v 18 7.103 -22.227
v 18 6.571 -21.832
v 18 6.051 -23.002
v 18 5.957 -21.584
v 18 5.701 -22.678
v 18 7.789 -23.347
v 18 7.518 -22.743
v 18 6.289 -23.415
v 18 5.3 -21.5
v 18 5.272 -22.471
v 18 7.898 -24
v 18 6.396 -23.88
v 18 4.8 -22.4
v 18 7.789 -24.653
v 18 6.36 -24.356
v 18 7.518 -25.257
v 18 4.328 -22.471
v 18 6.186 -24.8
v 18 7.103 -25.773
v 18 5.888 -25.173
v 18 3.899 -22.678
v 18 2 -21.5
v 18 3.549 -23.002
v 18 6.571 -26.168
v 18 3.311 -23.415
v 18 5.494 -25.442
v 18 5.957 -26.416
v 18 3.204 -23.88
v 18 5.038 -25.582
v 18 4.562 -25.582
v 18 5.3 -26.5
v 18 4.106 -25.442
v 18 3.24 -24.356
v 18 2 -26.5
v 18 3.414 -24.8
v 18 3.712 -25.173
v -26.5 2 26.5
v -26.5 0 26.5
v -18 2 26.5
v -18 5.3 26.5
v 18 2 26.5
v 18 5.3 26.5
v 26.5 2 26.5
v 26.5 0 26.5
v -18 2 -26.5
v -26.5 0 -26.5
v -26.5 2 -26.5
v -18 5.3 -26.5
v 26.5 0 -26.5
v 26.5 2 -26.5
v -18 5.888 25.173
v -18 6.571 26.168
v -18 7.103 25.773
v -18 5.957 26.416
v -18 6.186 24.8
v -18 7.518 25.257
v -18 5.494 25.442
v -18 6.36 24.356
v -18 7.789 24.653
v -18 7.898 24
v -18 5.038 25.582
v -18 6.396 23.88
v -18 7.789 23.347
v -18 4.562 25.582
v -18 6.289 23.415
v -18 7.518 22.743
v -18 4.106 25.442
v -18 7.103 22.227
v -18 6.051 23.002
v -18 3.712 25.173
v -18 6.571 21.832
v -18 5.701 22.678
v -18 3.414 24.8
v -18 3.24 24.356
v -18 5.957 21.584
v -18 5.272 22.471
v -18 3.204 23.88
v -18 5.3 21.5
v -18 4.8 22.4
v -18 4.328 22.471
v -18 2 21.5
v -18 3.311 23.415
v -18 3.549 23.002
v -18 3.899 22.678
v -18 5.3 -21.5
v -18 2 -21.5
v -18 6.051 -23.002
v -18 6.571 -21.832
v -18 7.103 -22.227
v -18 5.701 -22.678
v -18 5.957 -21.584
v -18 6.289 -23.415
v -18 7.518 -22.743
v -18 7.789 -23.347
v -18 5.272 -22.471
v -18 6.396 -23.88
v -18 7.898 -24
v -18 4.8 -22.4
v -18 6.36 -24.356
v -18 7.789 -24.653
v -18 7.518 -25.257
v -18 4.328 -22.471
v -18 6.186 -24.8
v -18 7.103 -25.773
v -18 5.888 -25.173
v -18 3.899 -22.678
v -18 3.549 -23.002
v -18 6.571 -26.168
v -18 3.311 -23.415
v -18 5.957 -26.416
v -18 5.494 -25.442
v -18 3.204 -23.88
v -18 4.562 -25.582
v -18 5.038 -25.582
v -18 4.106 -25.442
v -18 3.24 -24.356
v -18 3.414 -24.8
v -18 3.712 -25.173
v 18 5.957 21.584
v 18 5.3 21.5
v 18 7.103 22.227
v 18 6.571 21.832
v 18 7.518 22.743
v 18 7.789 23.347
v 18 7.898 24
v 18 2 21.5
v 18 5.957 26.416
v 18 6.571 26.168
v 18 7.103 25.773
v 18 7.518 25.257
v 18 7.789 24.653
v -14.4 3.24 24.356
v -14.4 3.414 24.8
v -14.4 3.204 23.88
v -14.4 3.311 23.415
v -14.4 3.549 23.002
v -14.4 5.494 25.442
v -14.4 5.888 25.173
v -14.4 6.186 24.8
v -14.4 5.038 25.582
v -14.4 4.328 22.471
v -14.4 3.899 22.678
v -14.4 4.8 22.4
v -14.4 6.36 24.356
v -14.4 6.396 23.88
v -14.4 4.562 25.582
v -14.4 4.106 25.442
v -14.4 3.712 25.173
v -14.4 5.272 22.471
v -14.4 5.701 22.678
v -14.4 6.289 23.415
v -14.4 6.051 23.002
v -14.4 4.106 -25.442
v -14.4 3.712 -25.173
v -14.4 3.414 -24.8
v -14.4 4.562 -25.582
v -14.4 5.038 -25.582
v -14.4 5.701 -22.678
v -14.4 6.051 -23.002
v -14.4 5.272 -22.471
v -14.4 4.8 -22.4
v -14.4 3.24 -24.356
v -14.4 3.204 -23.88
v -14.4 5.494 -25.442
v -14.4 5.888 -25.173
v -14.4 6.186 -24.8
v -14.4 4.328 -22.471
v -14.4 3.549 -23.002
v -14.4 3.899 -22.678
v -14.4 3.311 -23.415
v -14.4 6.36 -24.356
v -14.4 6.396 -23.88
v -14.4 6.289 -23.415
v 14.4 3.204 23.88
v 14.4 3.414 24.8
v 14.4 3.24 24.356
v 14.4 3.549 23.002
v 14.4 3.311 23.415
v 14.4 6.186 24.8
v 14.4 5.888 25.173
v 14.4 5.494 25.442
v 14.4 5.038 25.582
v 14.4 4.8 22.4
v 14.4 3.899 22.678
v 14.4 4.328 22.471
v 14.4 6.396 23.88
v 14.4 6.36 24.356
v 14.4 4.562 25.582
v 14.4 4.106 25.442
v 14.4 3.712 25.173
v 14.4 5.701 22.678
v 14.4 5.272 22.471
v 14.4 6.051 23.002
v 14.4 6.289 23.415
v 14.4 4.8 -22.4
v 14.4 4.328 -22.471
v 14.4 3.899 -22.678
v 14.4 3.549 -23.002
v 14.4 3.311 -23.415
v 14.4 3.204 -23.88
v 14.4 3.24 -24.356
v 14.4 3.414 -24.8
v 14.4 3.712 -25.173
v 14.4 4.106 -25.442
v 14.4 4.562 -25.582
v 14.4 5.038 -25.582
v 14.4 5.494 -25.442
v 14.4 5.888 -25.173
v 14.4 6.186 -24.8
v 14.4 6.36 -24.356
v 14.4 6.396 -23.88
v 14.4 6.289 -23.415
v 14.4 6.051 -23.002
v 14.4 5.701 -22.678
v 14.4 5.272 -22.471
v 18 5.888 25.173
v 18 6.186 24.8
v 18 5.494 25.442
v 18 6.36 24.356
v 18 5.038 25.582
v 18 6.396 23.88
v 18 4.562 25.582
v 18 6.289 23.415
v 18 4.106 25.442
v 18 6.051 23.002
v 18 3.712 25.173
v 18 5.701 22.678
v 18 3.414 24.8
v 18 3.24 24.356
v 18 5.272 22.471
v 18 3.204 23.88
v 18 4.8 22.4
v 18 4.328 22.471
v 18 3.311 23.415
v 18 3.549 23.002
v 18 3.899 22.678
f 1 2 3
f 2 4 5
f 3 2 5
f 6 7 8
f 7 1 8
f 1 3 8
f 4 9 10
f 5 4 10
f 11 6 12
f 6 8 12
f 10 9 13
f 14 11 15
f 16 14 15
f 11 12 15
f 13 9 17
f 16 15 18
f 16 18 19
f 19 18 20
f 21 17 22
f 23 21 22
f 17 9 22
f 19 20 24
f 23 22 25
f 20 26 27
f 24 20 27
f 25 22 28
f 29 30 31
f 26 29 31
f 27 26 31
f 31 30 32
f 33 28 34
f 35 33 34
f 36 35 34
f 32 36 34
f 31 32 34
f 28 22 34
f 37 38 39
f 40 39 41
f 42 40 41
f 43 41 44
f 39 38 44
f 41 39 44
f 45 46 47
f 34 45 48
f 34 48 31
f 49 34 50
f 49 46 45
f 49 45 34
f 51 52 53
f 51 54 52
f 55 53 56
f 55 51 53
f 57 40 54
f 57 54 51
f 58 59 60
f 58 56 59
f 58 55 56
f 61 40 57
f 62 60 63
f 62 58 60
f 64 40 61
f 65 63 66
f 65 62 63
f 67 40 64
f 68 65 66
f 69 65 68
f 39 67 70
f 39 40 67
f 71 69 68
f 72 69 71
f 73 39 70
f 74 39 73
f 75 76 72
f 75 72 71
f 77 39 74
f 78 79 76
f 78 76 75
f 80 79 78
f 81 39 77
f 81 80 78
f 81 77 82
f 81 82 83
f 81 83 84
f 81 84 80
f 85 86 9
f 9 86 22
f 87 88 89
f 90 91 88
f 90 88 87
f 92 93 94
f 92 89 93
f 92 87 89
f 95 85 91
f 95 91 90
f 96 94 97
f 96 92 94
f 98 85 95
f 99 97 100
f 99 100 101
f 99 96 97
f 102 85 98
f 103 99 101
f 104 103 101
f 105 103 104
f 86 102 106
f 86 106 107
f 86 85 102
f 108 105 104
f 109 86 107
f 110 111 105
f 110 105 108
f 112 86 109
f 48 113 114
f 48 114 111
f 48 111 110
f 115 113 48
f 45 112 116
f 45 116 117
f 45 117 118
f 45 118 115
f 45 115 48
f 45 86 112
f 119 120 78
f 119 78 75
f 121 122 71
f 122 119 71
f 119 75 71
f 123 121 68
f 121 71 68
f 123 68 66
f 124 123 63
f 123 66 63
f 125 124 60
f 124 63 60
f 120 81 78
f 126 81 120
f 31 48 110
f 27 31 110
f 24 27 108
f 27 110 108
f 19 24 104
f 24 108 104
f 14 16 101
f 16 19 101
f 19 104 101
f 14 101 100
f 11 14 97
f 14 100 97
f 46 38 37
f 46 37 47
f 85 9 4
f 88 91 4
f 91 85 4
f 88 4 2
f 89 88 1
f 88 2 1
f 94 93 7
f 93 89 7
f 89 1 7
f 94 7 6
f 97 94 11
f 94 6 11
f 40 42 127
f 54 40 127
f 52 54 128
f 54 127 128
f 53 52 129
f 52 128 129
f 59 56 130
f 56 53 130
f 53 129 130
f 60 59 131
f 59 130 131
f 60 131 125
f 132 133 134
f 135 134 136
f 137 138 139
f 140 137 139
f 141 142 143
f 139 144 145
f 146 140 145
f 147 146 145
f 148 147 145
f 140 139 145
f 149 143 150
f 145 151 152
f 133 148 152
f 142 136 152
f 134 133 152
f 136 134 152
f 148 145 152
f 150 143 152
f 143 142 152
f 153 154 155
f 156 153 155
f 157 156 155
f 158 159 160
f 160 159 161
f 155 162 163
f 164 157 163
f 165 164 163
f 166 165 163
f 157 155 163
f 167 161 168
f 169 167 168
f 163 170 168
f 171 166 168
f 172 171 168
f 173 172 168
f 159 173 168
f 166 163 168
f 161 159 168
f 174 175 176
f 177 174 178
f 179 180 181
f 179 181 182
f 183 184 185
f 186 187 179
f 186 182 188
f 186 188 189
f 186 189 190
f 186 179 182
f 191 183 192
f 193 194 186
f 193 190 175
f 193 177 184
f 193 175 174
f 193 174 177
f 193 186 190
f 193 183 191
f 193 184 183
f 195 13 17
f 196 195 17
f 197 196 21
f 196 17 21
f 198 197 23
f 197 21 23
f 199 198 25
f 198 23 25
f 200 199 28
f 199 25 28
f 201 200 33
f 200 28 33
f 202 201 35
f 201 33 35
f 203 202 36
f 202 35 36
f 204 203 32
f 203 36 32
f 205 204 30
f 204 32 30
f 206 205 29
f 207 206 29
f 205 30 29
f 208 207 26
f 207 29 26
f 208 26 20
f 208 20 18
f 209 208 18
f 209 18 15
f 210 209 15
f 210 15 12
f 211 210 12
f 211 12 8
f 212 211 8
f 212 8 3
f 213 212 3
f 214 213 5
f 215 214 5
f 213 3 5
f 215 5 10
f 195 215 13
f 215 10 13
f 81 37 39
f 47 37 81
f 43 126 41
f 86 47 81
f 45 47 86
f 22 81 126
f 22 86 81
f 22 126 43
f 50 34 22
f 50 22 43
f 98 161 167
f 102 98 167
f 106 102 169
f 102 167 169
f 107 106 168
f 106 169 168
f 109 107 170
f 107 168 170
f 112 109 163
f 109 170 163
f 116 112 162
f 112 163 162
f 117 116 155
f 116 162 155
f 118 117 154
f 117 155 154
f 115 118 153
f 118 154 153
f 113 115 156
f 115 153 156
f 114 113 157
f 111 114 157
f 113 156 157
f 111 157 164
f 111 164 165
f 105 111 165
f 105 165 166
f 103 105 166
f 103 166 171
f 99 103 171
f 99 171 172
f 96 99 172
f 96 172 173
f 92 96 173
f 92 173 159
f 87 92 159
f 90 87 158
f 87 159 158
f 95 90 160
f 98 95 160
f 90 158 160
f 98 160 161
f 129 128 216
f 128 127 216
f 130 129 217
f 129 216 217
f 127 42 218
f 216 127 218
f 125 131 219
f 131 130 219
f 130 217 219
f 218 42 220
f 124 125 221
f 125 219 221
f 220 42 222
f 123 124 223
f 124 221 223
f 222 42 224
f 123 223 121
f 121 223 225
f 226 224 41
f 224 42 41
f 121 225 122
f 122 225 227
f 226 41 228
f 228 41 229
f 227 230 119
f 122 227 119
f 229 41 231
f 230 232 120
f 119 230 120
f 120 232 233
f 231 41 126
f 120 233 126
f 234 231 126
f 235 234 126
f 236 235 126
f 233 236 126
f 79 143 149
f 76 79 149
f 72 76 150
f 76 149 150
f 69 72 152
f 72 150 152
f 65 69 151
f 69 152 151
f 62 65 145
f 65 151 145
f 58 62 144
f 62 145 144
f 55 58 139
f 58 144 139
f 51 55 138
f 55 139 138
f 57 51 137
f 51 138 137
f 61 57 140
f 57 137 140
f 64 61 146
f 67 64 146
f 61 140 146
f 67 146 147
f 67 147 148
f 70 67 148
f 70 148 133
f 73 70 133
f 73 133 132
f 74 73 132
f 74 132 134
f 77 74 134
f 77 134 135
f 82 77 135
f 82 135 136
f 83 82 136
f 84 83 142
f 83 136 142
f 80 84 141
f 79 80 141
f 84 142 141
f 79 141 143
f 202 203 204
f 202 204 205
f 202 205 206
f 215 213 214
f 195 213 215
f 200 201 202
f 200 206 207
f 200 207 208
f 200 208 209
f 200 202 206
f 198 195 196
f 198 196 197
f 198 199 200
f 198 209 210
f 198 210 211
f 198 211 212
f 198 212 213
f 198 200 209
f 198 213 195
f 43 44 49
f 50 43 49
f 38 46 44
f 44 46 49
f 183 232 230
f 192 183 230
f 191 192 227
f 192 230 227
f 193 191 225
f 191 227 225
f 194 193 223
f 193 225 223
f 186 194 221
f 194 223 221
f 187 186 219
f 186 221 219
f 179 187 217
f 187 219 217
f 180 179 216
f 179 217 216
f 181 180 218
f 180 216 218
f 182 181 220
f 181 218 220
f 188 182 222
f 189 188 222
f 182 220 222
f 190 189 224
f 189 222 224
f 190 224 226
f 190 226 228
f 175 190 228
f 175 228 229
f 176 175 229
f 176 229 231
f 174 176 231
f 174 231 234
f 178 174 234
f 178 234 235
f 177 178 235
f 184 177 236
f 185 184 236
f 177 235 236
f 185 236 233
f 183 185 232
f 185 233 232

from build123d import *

# Parameters (mm, degrees)
SKETCH1_W           = 53
SKETCH1_H           = 53
BOSS_EXTRUDE1_DEPTH = 2
SKETCH2_W           = 36
SKETCH2_H           = 5
BOSS_EXTRUDE2_DEPTH = 5.9
SKETCH3_R           = 1.6
CUT_EXTRUDE1_DEPTH  = 3.6
CUT_EXTRUDE2_START  = 3.6
SKETCH4_R           = 1.6
CUT_EXTRUDE2_DEPTH  = 3.6
FILLET1_R           = 2.6


with BuildPart() as part:
    # Sketch1 → Boss-Extrude1 (new body)
    with BuildSketch(Plane(origin=(0, 0, 0), x_dir=(1, 0, 0), z_dir=(0, 1, 0))):
        Rectangle(SKETCH1_W, SKETCH1_H)
    extrude(amount=BOSS_EXTRUDE1_DEPTH)

    # Sketch2 → Boss-Extrude2 (add)
    with BuildSketch(Plane(origin=(0, 2, 0), x_dir=(1, 0, 0), z_dir=(0, 1, 0))):
        with Locations((0, 24)):
            Rectangle(SKETCH2_W, SKETCH2_H)
        with Locations((0, -24)):
            Rectangle(SKETCH2_W, SKETCH2_H)
    extrude(amount=BOSS_EXTRUDE2_DEPTH)

    # Sketch3 → Cut-Extrude1 (cut)
    with BuildSketch(Plane(origin=(18, 0, 0), x_dir=(0, 0, -1), z_dir=(1, 0, 0))):
        with Locations((-24, 4.8)):
            Circle(SKETCH3_R)
        with Locations(Location((24, 4.8, 0), (0, 0, 180))):
            Circle(SKETCH3_R)
    extrude(amount=-CUT_EXTRUDE1_DEPTH, mode=Mode.SUBTRACT)

    # Sketch4 → Cut-Extrude2 (cut)
    with BuildSketch(Plane(origin=(-18, 0, -18), x_dir=(0, 0, -1), z_dir=(1, 0, 0)).offset(CUT_EXTRUDE2_START)):
        with Locations((-42, 4.8)):
            Circle(SKETCH4_R)
        with Locations(Location((6, 4.8, 0), (0, 0, 180))):
            Circle(SKETCH4_R)
    extrude(amount=-CUT_EXTRUDE2_DEPTH, mode=Mode.SUBTRACT)

    # Fillet1
    # the kernel refuses this fillet: 2.6 mm, written as the material it takes off along each edge
    with BuildSketch(Plane(origin=(-24.5, 7.9, -26.5), x_dir=(0, -1, 0), z_dir=(1, 0, 0)), Plane(origin=(24.5, 7.9, -21.5), x_dir=(0, -1, 0), z_dir=(-1, 0, 0)), Plane(origin=(24.5, 7.9, 26.5), x_dir=(0, -1, 0), z_dir=(-1, 0, 0))) as fillet1_piece_1:
        with BuildLine():
            CenterArc((FILLET1_R, -FILLET1_R), FILLET1_R, 90, 90)
            Line((0, -FILLET1_R), (0, 0))
            Line((0, 0), (FILLET1_R, 0))
        make_face()
    extrude(amount=49, mode=Mode.SUBTRACT)
    with BuildSketch(Plane(origin=(-24.5, 7.9, 21.5), x_dir=(0, 0, 1), z_dir=(1, 0, 0))) as fillet1_piece_2:
        with BuildLine():
            CenterArc((FILLET1_R, FILLET1_R), FILLET1_R, 180, 90)
            Line((0, FILLET1_R), (0, 0))
            Line((0, 0), (FILLET1_R, 0))
        make_face()
    extrude(amount=49, mode=Mode.SUBTRACT)


solid = part.part
